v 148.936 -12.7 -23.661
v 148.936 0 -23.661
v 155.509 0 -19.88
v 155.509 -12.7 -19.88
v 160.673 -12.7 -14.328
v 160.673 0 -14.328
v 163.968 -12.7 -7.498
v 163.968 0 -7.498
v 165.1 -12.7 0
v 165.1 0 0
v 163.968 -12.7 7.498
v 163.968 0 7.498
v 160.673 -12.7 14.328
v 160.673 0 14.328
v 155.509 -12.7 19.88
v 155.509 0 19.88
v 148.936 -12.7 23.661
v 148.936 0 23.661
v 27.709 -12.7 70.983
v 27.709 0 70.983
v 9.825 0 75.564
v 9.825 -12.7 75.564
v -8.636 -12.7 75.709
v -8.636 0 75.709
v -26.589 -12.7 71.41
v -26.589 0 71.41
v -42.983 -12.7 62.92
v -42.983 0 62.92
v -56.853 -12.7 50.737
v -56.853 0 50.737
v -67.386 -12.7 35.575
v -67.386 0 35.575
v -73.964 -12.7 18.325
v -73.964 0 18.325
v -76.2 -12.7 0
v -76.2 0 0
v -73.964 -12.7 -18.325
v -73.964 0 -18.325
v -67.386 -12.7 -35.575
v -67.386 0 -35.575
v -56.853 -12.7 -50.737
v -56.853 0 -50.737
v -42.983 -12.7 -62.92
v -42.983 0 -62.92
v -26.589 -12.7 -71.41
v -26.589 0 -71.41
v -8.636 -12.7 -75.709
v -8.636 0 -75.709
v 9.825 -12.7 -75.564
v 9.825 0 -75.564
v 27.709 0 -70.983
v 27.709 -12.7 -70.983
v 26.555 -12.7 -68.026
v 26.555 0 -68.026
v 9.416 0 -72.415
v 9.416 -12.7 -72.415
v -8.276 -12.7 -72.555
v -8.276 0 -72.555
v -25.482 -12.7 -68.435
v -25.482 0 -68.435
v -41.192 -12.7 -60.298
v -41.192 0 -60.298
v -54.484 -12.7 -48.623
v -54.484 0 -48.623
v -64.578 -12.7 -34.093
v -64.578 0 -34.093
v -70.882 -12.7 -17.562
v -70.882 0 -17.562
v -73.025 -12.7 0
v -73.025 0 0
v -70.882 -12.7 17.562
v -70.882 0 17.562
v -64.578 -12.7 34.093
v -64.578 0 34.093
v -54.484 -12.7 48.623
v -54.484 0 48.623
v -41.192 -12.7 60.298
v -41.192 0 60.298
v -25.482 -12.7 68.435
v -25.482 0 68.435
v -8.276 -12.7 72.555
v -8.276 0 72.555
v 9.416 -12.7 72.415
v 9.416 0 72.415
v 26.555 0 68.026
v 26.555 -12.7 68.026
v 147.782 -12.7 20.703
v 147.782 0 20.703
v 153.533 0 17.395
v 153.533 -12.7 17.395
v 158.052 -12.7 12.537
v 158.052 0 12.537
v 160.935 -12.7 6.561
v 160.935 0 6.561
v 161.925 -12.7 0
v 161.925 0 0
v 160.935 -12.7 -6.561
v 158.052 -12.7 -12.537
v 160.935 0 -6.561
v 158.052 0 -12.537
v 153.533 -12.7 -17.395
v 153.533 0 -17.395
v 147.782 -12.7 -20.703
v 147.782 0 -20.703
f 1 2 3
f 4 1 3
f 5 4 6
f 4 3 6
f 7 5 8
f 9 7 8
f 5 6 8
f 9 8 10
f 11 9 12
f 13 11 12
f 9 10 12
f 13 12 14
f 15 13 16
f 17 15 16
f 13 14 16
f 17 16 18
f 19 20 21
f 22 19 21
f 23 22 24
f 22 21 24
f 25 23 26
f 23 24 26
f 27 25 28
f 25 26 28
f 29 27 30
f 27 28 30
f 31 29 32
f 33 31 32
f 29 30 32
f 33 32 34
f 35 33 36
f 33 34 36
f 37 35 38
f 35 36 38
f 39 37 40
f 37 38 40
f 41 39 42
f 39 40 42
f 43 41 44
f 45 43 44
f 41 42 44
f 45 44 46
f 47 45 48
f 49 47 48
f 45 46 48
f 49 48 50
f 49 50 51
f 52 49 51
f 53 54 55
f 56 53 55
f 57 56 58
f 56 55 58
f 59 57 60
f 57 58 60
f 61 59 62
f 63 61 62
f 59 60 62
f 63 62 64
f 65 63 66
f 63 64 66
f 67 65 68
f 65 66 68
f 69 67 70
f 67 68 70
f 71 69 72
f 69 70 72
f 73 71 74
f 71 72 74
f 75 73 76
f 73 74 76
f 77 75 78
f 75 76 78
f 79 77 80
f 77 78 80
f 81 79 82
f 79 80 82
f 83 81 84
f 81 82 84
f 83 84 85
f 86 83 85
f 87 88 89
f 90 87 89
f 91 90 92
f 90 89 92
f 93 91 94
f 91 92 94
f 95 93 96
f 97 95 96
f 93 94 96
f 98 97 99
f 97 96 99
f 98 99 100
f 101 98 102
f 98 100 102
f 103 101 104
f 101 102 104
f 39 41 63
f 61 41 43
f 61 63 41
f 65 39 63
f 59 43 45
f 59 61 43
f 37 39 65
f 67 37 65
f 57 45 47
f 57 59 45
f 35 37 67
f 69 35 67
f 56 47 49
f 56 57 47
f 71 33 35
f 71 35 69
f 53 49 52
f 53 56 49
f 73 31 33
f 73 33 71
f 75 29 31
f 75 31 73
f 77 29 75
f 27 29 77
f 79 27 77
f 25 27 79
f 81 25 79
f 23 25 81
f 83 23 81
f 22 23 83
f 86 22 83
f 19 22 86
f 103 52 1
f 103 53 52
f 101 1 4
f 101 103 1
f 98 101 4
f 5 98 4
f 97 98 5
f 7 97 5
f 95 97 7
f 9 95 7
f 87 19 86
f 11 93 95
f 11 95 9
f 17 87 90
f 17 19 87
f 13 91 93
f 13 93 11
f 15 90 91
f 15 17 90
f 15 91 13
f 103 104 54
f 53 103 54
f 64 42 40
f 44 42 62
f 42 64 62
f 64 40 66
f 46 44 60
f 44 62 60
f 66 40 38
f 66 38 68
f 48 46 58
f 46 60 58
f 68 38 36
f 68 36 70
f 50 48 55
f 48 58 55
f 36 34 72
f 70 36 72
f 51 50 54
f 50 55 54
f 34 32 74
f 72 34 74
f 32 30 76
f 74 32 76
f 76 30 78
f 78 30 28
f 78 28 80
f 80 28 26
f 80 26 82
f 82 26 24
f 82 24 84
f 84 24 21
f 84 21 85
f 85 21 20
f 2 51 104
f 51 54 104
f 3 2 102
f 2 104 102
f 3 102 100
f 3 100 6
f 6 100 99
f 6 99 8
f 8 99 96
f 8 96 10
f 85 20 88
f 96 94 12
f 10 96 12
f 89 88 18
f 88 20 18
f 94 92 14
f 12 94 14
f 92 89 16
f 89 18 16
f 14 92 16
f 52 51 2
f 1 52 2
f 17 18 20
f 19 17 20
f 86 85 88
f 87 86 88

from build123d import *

# Parameters (mm, degrees)
F1_DEPTH = 12.7


with BuildPart() as f1:
    # F0 (on Front) → F1 (new body)
    with BuildSketch(Plane.XZ):
        with BuildLine():
            Line((148.936364, 23.661141), (27.709091, 70.983423))
            ThreePointArc((27.709091, 70.983423), (-76.2, 0), (27.709091, -70.983423))
            Line((27.709091, -70.983423), (148.936364, -23.661141))
            ThreePointArc((148.936364, -23.661141), (165.1, 0), (148.936364, 23.661141))
        make_face()
        with BuildLine():
            Line((147.781818, -20.703498), (26.554545, -68.02578))
            ThreePointArc((26.554545, -68.02578), (-73.025, 0), (26.554545, 68.02578))
            Line((26.554545, 68.02578), (147.781818, 20.703498))
            ThreePointArc((147.781818, 20.703498), (161.925, 0), (147.781818, -20.703498))
        make_face(mode=Mode.SUBTRACT)
    extrude(amount=F1_DEPTH)


solid = f1.part
